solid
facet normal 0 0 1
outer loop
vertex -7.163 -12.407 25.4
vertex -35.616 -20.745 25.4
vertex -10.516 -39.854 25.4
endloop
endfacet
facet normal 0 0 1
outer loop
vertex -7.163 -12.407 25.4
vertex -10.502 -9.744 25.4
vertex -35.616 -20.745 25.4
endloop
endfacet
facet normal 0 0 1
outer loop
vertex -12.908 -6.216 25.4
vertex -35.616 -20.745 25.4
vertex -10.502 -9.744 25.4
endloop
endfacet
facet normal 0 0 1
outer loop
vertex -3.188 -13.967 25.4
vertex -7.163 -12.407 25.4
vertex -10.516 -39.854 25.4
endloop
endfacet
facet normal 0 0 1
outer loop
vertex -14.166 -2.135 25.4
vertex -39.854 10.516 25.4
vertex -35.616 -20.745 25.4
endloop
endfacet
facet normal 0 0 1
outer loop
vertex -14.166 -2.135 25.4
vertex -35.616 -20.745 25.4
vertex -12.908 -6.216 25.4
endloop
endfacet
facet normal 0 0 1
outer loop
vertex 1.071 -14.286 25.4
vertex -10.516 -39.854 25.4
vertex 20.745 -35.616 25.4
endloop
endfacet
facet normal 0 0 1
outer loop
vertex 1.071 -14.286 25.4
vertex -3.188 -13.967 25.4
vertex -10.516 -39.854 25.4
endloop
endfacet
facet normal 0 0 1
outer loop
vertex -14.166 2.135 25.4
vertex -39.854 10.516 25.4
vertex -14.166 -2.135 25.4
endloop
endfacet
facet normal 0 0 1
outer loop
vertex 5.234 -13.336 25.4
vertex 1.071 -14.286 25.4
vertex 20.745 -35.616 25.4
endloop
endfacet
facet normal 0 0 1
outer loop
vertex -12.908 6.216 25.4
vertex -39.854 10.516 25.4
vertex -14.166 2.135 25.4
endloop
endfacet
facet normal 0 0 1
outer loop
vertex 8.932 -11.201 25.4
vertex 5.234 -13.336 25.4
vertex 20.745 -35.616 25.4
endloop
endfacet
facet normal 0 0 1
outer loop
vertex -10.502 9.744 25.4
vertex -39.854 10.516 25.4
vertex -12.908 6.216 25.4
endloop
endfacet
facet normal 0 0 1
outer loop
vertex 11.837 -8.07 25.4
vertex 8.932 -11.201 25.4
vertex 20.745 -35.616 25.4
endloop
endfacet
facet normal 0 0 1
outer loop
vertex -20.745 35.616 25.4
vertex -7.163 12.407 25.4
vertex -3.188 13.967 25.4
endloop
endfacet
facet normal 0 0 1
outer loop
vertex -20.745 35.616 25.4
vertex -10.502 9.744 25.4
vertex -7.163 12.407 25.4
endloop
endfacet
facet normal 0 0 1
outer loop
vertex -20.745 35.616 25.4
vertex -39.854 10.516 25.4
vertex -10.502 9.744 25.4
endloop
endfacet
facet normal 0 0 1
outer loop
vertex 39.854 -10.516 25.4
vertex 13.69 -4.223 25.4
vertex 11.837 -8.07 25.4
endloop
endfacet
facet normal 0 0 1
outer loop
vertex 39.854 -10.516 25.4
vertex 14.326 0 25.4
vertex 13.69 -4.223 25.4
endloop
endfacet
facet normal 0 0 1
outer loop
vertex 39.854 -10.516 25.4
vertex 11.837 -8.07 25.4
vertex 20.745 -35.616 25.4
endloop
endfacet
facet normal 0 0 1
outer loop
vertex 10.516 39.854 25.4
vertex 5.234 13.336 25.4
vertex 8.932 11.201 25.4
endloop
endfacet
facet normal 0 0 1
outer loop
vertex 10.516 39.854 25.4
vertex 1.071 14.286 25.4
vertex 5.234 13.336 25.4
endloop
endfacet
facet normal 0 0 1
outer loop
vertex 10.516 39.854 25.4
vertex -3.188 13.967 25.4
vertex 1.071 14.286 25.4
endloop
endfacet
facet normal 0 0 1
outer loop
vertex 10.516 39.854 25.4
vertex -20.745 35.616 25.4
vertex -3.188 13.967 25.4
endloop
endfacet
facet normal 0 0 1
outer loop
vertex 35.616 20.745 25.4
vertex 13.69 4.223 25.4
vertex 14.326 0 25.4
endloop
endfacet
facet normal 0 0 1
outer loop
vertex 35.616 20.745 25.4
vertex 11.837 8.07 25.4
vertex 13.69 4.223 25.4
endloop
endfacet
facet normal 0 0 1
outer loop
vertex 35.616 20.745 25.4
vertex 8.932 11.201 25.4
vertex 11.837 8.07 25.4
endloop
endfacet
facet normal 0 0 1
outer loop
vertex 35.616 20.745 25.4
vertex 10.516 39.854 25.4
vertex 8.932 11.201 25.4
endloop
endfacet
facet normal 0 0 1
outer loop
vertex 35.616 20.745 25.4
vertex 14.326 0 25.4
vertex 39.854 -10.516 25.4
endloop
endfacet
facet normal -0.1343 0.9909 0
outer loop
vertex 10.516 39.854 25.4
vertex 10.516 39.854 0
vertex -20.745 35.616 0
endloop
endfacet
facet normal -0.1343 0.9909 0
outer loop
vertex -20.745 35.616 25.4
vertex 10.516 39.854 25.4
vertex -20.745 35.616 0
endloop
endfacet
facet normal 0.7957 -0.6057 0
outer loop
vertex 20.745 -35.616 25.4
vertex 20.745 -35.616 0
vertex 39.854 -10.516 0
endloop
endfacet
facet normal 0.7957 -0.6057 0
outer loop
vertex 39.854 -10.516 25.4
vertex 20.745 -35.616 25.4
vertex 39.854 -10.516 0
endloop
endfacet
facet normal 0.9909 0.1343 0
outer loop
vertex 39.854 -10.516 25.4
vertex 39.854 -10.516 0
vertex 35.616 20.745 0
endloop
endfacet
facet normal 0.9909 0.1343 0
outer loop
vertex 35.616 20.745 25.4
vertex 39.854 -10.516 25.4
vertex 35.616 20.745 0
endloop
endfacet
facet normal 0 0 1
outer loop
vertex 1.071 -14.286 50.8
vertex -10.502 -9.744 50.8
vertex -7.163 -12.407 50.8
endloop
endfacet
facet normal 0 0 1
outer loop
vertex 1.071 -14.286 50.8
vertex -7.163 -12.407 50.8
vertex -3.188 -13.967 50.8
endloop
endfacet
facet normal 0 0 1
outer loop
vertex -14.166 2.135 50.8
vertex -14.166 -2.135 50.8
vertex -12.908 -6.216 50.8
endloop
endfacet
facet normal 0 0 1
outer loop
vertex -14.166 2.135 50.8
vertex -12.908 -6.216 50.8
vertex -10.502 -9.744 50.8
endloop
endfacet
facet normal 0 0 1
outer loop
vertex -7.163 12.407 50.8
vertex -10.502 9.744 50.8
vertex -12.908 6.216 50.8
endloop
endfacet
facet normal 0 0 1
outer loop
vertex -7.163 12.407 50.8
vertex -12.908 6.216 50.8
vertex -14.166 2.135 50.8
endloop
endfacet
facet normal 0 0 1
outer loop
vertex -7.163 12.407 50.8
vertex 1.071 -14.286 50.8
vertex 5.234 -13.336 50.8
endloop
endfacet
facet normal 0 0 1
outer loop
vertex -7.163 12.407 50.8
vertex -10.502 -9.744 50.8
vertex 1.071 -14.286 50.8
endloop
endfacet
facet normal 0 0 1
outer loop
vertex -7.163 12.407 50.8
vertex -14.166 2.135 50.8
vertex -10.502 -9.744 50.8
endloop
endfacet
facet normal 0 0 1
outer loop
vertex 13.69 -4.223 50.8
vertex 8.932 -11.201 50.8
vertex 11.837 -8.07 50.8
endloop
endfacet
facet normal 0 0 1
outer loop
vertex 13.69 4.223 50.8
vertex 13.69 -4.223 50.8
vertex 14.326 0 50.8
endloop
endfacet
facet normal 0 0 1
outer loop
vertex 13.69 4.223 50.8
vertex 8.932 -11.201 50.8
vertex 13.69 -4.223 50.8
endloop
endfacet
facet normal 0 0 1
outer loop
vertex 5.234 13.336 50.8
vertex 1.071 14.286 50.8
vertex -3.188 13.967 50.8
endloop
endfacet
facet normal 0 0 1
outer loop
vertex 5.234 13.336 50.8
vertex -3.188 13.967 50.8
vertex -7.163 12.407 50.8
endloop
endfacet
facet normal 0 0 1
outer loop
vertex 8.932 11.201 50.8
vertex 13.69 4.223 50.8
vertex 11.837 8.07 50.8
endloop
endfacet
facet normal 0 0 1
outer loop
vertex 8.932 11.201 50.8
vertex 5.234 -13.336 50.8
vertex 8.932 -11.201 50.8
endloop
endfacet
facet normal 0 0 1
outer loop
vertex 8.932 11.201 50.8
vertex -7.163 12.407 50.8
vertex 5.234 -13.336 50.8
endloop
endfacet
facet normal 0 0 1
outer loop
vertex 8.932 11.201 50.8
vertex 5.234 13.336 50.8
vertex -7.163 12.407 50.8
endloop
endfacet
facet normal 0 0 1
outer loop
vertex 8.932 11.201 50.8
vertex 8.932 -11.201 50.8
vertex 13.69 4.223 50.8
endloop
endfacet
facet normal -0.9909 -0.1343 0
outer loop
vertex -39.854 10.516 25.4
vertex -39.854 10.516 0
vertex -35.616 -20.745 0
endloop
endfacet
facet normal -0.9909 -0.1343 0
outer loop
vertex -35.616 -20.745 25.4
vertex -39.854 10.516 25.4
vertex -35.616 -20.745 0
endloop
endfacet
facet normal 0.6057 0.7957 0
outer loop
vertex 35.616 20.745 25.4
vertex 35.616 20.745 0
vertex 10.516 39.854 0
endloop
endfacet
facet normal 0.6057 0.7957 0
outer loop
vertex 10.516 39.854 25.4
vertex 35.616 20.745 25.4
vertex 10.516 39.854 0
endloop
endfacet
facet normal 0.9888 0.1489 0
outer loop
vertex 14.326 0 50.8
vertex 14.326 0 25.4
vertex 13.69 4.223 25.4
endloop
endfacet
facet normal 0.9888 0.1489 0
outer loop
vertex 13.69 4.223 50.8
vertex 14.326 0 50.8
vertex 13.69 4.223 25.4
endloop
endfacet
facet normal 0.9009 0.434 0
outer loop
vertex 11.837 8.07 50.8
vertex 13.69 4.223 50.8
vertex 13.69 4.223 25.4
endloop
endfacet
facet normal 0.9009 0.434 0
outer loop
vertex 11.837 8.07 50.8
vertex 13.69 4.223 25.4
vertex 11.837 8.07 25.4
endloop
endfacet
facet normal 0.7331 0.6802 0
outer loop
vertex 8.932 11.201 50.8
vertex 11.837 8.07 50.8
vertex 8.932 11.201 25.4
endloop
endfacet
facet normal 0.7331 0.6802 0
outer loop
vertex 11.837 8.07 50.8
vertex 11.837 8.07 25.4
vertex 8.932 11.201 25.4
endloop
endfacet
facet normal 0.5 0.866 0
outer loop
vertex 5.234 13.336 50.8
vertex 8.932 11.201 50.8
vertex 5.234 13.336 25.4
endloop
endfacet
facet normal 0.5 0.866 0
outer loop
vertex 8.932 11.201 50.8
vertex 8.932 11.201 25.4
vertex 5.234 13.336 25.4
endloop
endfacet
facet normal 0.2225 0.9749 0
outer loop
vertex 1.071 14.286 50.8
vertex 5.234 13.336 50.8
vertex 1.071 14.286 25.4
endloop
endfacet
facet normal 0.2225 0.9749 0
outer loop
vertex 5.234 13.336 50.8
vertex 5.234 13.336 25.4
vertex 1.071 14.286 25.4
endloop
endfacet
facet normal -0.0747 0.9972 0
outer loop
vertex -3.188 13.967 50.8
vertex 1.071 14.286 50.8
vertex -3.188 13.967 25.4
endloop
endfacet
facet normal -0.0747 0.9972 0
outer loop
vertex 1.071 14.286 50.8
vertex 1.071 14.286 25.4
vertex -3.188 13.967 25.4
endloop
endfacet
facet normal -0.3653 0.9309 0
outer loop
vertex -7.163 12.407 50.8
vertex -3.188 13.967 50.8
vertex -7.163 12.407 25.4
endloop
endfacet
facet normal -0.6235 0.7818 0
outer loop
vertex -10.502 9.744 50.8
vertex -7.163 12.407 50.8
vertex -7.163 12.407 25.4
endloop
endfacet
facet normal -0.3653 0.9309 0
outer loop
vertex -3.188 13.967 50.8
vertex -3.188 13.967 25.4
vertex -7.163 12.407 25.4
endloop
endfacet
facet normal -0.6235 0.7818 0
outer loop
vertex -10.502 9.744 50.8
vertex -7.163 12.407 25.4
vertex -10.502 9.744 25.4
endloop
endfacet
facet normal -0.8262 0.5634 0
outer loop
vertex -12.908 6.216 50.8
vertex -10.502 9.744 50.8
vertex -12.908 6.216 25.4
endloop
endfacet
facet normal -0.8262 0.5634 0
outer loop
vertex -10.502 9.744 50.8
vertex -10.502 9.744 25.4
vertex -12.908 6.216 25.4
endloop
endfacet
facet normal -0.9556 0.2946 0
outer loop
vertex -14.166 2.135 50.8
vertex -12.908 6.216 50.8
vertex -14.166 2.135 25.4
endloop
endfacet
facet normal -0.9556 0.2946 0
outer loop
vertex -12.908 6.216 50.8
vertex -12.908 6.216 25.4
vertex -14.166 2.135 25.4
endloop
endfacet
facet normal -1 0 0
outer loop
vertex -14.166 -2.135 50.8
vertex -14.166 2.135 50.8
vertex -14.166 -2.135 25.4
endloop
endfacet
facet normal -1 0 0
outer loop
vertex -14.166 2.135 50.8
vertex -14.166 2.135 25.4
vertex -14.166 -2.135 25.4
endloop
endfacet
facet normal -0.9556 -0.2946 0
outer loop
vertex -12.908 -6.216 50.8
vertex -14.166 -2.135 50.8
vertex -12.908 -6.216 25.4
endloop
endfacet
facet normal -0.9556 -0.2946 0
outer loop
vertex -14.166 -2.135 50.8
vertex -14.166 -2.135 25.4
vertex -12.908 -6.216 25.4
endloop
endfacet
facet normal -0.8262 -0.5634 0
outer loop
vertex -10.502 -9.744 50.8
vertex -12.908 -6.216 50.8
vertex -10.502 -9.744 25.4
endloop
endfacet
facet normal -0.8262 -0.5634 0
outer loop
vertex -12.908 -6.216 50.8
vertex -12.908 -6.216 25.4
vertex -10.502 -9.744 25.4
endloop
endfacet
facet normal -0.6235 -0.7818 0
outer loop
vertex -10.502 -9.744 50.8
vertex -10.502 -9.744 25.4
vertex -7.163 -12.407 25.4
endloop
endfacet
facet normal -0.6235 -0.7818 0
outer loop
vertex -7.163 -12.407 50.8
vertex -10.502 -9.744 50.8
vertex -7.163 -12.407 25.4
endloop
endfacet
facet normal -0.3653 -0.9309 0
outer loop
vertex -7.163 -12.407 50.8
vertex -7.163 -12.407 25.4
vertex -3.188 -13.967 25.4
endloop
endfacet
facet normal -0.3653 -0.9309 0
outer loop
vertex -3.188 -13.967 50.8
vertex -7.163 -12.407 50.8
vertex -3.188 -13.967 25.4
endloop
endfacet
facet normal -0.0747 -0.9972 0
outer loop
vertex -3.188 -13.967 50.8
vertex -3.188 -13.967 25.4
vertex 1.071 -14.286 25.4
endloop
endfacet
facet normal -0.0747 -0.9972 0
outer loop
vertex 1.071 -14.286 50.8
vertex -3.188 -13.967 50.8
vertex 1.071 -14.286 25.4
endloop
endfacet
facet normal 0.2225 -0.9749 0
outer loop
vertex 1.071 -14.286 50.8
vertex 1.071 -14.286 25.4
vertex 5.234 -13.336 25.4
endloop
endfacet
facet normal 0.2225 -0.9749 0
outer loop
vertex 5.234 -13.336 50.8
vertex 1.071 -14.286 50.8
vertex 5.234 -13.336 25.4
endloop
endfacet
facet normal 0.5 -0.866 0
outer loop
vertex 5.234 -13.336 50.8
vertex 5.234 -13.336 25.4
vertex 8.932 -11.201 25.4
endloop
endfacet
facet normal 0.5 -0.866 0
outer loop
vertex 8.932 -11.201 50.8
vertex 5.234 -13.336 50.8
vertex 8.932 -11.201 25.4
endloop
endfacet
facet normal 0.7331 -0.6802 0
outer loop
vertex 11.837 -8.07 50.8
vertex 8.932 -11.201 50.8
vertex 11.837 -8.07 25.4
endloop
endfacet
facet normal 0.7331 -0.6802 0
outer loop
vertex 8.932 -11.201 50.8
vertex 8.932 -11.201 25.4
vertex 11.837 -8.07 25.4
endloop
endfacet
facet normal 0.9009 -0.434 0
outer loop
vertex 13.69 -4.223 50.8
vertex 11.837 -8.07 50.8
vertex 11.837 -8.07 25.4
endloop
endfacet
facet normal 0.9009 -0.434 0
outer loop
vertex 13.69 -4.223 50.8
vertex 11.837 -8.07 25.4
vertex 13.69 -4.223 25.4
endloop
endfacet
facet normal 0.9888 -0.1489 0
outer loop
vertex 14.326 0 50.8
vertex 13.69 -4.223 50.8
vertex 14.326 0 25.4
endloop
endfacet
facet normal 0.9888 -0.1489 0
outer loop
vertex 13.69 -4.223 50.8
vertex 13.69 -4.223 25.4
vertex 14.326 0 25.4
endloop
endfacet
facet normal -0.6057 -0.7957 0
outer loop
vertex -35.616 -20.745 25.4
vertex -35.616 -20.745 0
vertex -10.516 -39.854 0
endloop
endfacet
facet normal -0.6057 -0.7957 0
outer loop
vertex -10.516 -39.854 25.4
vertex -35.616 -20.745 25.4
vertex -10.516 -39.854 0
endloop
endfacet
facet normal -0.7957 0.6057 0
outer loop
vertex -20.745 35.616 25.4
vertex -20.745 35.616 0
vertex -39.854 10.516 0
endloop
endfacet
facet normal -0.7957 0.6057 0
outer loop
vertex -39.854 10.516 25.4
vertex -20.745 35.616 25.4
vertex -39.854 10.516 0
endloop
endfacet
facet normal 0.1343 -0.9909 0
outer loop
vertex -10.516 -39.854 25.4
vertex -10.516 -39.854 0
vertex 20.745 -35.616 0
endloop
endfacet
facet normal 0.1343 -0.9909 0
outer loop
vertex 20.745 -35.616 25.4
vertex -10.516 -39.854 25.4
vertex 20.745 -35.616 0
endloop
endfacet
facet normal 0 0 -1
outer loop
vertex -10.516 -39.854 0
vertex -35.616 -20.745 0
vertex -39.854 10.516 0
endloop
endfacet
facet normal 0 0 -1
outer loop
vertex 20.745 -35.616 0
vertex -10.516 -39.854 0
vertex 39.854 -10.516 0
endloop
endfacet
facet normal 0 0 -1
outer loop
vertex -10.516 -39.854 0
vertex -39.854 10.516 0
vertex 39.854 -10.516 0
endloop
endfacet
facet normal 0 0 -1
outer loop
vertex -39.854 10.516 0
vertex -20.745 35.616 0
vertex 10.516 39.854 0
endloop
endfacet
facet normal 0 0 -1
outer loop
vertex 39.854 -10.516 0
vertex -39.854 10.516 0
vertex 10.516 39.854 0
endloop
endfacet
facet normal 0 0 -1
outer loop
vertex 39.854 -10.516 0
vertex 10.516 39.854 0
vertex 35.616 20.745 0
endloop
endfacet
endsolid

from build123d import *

# Parameters (mm, degrees)
F1_DEPTH = 25.4
F2_R     = 14.326278
F3_DEPTH = 25.4


with BuildPart() as f1:
    # F0 (on Top) → F1 (new body)
    with BuildSketch(Plane.XY):
        Polygon((20.745088, -35.616433), (39.853613, -10.515629), (35.616433, 20.745088), (10.515629, 39.853613), (-20.745088, 35.616433), (-39.853613, 10.515629), (-35.616433, -20.745088), (-10.515629, -39.853613), align=None)
    extrude(amount=F1_DEPTH)

    # F2 (on face) → F3 (join)
    with BuildSketch(Plane.XY.offset(25.4)):
        Circle(F2_R)
    extrude(amount=F3_DEPTH)


solid = f1.part
